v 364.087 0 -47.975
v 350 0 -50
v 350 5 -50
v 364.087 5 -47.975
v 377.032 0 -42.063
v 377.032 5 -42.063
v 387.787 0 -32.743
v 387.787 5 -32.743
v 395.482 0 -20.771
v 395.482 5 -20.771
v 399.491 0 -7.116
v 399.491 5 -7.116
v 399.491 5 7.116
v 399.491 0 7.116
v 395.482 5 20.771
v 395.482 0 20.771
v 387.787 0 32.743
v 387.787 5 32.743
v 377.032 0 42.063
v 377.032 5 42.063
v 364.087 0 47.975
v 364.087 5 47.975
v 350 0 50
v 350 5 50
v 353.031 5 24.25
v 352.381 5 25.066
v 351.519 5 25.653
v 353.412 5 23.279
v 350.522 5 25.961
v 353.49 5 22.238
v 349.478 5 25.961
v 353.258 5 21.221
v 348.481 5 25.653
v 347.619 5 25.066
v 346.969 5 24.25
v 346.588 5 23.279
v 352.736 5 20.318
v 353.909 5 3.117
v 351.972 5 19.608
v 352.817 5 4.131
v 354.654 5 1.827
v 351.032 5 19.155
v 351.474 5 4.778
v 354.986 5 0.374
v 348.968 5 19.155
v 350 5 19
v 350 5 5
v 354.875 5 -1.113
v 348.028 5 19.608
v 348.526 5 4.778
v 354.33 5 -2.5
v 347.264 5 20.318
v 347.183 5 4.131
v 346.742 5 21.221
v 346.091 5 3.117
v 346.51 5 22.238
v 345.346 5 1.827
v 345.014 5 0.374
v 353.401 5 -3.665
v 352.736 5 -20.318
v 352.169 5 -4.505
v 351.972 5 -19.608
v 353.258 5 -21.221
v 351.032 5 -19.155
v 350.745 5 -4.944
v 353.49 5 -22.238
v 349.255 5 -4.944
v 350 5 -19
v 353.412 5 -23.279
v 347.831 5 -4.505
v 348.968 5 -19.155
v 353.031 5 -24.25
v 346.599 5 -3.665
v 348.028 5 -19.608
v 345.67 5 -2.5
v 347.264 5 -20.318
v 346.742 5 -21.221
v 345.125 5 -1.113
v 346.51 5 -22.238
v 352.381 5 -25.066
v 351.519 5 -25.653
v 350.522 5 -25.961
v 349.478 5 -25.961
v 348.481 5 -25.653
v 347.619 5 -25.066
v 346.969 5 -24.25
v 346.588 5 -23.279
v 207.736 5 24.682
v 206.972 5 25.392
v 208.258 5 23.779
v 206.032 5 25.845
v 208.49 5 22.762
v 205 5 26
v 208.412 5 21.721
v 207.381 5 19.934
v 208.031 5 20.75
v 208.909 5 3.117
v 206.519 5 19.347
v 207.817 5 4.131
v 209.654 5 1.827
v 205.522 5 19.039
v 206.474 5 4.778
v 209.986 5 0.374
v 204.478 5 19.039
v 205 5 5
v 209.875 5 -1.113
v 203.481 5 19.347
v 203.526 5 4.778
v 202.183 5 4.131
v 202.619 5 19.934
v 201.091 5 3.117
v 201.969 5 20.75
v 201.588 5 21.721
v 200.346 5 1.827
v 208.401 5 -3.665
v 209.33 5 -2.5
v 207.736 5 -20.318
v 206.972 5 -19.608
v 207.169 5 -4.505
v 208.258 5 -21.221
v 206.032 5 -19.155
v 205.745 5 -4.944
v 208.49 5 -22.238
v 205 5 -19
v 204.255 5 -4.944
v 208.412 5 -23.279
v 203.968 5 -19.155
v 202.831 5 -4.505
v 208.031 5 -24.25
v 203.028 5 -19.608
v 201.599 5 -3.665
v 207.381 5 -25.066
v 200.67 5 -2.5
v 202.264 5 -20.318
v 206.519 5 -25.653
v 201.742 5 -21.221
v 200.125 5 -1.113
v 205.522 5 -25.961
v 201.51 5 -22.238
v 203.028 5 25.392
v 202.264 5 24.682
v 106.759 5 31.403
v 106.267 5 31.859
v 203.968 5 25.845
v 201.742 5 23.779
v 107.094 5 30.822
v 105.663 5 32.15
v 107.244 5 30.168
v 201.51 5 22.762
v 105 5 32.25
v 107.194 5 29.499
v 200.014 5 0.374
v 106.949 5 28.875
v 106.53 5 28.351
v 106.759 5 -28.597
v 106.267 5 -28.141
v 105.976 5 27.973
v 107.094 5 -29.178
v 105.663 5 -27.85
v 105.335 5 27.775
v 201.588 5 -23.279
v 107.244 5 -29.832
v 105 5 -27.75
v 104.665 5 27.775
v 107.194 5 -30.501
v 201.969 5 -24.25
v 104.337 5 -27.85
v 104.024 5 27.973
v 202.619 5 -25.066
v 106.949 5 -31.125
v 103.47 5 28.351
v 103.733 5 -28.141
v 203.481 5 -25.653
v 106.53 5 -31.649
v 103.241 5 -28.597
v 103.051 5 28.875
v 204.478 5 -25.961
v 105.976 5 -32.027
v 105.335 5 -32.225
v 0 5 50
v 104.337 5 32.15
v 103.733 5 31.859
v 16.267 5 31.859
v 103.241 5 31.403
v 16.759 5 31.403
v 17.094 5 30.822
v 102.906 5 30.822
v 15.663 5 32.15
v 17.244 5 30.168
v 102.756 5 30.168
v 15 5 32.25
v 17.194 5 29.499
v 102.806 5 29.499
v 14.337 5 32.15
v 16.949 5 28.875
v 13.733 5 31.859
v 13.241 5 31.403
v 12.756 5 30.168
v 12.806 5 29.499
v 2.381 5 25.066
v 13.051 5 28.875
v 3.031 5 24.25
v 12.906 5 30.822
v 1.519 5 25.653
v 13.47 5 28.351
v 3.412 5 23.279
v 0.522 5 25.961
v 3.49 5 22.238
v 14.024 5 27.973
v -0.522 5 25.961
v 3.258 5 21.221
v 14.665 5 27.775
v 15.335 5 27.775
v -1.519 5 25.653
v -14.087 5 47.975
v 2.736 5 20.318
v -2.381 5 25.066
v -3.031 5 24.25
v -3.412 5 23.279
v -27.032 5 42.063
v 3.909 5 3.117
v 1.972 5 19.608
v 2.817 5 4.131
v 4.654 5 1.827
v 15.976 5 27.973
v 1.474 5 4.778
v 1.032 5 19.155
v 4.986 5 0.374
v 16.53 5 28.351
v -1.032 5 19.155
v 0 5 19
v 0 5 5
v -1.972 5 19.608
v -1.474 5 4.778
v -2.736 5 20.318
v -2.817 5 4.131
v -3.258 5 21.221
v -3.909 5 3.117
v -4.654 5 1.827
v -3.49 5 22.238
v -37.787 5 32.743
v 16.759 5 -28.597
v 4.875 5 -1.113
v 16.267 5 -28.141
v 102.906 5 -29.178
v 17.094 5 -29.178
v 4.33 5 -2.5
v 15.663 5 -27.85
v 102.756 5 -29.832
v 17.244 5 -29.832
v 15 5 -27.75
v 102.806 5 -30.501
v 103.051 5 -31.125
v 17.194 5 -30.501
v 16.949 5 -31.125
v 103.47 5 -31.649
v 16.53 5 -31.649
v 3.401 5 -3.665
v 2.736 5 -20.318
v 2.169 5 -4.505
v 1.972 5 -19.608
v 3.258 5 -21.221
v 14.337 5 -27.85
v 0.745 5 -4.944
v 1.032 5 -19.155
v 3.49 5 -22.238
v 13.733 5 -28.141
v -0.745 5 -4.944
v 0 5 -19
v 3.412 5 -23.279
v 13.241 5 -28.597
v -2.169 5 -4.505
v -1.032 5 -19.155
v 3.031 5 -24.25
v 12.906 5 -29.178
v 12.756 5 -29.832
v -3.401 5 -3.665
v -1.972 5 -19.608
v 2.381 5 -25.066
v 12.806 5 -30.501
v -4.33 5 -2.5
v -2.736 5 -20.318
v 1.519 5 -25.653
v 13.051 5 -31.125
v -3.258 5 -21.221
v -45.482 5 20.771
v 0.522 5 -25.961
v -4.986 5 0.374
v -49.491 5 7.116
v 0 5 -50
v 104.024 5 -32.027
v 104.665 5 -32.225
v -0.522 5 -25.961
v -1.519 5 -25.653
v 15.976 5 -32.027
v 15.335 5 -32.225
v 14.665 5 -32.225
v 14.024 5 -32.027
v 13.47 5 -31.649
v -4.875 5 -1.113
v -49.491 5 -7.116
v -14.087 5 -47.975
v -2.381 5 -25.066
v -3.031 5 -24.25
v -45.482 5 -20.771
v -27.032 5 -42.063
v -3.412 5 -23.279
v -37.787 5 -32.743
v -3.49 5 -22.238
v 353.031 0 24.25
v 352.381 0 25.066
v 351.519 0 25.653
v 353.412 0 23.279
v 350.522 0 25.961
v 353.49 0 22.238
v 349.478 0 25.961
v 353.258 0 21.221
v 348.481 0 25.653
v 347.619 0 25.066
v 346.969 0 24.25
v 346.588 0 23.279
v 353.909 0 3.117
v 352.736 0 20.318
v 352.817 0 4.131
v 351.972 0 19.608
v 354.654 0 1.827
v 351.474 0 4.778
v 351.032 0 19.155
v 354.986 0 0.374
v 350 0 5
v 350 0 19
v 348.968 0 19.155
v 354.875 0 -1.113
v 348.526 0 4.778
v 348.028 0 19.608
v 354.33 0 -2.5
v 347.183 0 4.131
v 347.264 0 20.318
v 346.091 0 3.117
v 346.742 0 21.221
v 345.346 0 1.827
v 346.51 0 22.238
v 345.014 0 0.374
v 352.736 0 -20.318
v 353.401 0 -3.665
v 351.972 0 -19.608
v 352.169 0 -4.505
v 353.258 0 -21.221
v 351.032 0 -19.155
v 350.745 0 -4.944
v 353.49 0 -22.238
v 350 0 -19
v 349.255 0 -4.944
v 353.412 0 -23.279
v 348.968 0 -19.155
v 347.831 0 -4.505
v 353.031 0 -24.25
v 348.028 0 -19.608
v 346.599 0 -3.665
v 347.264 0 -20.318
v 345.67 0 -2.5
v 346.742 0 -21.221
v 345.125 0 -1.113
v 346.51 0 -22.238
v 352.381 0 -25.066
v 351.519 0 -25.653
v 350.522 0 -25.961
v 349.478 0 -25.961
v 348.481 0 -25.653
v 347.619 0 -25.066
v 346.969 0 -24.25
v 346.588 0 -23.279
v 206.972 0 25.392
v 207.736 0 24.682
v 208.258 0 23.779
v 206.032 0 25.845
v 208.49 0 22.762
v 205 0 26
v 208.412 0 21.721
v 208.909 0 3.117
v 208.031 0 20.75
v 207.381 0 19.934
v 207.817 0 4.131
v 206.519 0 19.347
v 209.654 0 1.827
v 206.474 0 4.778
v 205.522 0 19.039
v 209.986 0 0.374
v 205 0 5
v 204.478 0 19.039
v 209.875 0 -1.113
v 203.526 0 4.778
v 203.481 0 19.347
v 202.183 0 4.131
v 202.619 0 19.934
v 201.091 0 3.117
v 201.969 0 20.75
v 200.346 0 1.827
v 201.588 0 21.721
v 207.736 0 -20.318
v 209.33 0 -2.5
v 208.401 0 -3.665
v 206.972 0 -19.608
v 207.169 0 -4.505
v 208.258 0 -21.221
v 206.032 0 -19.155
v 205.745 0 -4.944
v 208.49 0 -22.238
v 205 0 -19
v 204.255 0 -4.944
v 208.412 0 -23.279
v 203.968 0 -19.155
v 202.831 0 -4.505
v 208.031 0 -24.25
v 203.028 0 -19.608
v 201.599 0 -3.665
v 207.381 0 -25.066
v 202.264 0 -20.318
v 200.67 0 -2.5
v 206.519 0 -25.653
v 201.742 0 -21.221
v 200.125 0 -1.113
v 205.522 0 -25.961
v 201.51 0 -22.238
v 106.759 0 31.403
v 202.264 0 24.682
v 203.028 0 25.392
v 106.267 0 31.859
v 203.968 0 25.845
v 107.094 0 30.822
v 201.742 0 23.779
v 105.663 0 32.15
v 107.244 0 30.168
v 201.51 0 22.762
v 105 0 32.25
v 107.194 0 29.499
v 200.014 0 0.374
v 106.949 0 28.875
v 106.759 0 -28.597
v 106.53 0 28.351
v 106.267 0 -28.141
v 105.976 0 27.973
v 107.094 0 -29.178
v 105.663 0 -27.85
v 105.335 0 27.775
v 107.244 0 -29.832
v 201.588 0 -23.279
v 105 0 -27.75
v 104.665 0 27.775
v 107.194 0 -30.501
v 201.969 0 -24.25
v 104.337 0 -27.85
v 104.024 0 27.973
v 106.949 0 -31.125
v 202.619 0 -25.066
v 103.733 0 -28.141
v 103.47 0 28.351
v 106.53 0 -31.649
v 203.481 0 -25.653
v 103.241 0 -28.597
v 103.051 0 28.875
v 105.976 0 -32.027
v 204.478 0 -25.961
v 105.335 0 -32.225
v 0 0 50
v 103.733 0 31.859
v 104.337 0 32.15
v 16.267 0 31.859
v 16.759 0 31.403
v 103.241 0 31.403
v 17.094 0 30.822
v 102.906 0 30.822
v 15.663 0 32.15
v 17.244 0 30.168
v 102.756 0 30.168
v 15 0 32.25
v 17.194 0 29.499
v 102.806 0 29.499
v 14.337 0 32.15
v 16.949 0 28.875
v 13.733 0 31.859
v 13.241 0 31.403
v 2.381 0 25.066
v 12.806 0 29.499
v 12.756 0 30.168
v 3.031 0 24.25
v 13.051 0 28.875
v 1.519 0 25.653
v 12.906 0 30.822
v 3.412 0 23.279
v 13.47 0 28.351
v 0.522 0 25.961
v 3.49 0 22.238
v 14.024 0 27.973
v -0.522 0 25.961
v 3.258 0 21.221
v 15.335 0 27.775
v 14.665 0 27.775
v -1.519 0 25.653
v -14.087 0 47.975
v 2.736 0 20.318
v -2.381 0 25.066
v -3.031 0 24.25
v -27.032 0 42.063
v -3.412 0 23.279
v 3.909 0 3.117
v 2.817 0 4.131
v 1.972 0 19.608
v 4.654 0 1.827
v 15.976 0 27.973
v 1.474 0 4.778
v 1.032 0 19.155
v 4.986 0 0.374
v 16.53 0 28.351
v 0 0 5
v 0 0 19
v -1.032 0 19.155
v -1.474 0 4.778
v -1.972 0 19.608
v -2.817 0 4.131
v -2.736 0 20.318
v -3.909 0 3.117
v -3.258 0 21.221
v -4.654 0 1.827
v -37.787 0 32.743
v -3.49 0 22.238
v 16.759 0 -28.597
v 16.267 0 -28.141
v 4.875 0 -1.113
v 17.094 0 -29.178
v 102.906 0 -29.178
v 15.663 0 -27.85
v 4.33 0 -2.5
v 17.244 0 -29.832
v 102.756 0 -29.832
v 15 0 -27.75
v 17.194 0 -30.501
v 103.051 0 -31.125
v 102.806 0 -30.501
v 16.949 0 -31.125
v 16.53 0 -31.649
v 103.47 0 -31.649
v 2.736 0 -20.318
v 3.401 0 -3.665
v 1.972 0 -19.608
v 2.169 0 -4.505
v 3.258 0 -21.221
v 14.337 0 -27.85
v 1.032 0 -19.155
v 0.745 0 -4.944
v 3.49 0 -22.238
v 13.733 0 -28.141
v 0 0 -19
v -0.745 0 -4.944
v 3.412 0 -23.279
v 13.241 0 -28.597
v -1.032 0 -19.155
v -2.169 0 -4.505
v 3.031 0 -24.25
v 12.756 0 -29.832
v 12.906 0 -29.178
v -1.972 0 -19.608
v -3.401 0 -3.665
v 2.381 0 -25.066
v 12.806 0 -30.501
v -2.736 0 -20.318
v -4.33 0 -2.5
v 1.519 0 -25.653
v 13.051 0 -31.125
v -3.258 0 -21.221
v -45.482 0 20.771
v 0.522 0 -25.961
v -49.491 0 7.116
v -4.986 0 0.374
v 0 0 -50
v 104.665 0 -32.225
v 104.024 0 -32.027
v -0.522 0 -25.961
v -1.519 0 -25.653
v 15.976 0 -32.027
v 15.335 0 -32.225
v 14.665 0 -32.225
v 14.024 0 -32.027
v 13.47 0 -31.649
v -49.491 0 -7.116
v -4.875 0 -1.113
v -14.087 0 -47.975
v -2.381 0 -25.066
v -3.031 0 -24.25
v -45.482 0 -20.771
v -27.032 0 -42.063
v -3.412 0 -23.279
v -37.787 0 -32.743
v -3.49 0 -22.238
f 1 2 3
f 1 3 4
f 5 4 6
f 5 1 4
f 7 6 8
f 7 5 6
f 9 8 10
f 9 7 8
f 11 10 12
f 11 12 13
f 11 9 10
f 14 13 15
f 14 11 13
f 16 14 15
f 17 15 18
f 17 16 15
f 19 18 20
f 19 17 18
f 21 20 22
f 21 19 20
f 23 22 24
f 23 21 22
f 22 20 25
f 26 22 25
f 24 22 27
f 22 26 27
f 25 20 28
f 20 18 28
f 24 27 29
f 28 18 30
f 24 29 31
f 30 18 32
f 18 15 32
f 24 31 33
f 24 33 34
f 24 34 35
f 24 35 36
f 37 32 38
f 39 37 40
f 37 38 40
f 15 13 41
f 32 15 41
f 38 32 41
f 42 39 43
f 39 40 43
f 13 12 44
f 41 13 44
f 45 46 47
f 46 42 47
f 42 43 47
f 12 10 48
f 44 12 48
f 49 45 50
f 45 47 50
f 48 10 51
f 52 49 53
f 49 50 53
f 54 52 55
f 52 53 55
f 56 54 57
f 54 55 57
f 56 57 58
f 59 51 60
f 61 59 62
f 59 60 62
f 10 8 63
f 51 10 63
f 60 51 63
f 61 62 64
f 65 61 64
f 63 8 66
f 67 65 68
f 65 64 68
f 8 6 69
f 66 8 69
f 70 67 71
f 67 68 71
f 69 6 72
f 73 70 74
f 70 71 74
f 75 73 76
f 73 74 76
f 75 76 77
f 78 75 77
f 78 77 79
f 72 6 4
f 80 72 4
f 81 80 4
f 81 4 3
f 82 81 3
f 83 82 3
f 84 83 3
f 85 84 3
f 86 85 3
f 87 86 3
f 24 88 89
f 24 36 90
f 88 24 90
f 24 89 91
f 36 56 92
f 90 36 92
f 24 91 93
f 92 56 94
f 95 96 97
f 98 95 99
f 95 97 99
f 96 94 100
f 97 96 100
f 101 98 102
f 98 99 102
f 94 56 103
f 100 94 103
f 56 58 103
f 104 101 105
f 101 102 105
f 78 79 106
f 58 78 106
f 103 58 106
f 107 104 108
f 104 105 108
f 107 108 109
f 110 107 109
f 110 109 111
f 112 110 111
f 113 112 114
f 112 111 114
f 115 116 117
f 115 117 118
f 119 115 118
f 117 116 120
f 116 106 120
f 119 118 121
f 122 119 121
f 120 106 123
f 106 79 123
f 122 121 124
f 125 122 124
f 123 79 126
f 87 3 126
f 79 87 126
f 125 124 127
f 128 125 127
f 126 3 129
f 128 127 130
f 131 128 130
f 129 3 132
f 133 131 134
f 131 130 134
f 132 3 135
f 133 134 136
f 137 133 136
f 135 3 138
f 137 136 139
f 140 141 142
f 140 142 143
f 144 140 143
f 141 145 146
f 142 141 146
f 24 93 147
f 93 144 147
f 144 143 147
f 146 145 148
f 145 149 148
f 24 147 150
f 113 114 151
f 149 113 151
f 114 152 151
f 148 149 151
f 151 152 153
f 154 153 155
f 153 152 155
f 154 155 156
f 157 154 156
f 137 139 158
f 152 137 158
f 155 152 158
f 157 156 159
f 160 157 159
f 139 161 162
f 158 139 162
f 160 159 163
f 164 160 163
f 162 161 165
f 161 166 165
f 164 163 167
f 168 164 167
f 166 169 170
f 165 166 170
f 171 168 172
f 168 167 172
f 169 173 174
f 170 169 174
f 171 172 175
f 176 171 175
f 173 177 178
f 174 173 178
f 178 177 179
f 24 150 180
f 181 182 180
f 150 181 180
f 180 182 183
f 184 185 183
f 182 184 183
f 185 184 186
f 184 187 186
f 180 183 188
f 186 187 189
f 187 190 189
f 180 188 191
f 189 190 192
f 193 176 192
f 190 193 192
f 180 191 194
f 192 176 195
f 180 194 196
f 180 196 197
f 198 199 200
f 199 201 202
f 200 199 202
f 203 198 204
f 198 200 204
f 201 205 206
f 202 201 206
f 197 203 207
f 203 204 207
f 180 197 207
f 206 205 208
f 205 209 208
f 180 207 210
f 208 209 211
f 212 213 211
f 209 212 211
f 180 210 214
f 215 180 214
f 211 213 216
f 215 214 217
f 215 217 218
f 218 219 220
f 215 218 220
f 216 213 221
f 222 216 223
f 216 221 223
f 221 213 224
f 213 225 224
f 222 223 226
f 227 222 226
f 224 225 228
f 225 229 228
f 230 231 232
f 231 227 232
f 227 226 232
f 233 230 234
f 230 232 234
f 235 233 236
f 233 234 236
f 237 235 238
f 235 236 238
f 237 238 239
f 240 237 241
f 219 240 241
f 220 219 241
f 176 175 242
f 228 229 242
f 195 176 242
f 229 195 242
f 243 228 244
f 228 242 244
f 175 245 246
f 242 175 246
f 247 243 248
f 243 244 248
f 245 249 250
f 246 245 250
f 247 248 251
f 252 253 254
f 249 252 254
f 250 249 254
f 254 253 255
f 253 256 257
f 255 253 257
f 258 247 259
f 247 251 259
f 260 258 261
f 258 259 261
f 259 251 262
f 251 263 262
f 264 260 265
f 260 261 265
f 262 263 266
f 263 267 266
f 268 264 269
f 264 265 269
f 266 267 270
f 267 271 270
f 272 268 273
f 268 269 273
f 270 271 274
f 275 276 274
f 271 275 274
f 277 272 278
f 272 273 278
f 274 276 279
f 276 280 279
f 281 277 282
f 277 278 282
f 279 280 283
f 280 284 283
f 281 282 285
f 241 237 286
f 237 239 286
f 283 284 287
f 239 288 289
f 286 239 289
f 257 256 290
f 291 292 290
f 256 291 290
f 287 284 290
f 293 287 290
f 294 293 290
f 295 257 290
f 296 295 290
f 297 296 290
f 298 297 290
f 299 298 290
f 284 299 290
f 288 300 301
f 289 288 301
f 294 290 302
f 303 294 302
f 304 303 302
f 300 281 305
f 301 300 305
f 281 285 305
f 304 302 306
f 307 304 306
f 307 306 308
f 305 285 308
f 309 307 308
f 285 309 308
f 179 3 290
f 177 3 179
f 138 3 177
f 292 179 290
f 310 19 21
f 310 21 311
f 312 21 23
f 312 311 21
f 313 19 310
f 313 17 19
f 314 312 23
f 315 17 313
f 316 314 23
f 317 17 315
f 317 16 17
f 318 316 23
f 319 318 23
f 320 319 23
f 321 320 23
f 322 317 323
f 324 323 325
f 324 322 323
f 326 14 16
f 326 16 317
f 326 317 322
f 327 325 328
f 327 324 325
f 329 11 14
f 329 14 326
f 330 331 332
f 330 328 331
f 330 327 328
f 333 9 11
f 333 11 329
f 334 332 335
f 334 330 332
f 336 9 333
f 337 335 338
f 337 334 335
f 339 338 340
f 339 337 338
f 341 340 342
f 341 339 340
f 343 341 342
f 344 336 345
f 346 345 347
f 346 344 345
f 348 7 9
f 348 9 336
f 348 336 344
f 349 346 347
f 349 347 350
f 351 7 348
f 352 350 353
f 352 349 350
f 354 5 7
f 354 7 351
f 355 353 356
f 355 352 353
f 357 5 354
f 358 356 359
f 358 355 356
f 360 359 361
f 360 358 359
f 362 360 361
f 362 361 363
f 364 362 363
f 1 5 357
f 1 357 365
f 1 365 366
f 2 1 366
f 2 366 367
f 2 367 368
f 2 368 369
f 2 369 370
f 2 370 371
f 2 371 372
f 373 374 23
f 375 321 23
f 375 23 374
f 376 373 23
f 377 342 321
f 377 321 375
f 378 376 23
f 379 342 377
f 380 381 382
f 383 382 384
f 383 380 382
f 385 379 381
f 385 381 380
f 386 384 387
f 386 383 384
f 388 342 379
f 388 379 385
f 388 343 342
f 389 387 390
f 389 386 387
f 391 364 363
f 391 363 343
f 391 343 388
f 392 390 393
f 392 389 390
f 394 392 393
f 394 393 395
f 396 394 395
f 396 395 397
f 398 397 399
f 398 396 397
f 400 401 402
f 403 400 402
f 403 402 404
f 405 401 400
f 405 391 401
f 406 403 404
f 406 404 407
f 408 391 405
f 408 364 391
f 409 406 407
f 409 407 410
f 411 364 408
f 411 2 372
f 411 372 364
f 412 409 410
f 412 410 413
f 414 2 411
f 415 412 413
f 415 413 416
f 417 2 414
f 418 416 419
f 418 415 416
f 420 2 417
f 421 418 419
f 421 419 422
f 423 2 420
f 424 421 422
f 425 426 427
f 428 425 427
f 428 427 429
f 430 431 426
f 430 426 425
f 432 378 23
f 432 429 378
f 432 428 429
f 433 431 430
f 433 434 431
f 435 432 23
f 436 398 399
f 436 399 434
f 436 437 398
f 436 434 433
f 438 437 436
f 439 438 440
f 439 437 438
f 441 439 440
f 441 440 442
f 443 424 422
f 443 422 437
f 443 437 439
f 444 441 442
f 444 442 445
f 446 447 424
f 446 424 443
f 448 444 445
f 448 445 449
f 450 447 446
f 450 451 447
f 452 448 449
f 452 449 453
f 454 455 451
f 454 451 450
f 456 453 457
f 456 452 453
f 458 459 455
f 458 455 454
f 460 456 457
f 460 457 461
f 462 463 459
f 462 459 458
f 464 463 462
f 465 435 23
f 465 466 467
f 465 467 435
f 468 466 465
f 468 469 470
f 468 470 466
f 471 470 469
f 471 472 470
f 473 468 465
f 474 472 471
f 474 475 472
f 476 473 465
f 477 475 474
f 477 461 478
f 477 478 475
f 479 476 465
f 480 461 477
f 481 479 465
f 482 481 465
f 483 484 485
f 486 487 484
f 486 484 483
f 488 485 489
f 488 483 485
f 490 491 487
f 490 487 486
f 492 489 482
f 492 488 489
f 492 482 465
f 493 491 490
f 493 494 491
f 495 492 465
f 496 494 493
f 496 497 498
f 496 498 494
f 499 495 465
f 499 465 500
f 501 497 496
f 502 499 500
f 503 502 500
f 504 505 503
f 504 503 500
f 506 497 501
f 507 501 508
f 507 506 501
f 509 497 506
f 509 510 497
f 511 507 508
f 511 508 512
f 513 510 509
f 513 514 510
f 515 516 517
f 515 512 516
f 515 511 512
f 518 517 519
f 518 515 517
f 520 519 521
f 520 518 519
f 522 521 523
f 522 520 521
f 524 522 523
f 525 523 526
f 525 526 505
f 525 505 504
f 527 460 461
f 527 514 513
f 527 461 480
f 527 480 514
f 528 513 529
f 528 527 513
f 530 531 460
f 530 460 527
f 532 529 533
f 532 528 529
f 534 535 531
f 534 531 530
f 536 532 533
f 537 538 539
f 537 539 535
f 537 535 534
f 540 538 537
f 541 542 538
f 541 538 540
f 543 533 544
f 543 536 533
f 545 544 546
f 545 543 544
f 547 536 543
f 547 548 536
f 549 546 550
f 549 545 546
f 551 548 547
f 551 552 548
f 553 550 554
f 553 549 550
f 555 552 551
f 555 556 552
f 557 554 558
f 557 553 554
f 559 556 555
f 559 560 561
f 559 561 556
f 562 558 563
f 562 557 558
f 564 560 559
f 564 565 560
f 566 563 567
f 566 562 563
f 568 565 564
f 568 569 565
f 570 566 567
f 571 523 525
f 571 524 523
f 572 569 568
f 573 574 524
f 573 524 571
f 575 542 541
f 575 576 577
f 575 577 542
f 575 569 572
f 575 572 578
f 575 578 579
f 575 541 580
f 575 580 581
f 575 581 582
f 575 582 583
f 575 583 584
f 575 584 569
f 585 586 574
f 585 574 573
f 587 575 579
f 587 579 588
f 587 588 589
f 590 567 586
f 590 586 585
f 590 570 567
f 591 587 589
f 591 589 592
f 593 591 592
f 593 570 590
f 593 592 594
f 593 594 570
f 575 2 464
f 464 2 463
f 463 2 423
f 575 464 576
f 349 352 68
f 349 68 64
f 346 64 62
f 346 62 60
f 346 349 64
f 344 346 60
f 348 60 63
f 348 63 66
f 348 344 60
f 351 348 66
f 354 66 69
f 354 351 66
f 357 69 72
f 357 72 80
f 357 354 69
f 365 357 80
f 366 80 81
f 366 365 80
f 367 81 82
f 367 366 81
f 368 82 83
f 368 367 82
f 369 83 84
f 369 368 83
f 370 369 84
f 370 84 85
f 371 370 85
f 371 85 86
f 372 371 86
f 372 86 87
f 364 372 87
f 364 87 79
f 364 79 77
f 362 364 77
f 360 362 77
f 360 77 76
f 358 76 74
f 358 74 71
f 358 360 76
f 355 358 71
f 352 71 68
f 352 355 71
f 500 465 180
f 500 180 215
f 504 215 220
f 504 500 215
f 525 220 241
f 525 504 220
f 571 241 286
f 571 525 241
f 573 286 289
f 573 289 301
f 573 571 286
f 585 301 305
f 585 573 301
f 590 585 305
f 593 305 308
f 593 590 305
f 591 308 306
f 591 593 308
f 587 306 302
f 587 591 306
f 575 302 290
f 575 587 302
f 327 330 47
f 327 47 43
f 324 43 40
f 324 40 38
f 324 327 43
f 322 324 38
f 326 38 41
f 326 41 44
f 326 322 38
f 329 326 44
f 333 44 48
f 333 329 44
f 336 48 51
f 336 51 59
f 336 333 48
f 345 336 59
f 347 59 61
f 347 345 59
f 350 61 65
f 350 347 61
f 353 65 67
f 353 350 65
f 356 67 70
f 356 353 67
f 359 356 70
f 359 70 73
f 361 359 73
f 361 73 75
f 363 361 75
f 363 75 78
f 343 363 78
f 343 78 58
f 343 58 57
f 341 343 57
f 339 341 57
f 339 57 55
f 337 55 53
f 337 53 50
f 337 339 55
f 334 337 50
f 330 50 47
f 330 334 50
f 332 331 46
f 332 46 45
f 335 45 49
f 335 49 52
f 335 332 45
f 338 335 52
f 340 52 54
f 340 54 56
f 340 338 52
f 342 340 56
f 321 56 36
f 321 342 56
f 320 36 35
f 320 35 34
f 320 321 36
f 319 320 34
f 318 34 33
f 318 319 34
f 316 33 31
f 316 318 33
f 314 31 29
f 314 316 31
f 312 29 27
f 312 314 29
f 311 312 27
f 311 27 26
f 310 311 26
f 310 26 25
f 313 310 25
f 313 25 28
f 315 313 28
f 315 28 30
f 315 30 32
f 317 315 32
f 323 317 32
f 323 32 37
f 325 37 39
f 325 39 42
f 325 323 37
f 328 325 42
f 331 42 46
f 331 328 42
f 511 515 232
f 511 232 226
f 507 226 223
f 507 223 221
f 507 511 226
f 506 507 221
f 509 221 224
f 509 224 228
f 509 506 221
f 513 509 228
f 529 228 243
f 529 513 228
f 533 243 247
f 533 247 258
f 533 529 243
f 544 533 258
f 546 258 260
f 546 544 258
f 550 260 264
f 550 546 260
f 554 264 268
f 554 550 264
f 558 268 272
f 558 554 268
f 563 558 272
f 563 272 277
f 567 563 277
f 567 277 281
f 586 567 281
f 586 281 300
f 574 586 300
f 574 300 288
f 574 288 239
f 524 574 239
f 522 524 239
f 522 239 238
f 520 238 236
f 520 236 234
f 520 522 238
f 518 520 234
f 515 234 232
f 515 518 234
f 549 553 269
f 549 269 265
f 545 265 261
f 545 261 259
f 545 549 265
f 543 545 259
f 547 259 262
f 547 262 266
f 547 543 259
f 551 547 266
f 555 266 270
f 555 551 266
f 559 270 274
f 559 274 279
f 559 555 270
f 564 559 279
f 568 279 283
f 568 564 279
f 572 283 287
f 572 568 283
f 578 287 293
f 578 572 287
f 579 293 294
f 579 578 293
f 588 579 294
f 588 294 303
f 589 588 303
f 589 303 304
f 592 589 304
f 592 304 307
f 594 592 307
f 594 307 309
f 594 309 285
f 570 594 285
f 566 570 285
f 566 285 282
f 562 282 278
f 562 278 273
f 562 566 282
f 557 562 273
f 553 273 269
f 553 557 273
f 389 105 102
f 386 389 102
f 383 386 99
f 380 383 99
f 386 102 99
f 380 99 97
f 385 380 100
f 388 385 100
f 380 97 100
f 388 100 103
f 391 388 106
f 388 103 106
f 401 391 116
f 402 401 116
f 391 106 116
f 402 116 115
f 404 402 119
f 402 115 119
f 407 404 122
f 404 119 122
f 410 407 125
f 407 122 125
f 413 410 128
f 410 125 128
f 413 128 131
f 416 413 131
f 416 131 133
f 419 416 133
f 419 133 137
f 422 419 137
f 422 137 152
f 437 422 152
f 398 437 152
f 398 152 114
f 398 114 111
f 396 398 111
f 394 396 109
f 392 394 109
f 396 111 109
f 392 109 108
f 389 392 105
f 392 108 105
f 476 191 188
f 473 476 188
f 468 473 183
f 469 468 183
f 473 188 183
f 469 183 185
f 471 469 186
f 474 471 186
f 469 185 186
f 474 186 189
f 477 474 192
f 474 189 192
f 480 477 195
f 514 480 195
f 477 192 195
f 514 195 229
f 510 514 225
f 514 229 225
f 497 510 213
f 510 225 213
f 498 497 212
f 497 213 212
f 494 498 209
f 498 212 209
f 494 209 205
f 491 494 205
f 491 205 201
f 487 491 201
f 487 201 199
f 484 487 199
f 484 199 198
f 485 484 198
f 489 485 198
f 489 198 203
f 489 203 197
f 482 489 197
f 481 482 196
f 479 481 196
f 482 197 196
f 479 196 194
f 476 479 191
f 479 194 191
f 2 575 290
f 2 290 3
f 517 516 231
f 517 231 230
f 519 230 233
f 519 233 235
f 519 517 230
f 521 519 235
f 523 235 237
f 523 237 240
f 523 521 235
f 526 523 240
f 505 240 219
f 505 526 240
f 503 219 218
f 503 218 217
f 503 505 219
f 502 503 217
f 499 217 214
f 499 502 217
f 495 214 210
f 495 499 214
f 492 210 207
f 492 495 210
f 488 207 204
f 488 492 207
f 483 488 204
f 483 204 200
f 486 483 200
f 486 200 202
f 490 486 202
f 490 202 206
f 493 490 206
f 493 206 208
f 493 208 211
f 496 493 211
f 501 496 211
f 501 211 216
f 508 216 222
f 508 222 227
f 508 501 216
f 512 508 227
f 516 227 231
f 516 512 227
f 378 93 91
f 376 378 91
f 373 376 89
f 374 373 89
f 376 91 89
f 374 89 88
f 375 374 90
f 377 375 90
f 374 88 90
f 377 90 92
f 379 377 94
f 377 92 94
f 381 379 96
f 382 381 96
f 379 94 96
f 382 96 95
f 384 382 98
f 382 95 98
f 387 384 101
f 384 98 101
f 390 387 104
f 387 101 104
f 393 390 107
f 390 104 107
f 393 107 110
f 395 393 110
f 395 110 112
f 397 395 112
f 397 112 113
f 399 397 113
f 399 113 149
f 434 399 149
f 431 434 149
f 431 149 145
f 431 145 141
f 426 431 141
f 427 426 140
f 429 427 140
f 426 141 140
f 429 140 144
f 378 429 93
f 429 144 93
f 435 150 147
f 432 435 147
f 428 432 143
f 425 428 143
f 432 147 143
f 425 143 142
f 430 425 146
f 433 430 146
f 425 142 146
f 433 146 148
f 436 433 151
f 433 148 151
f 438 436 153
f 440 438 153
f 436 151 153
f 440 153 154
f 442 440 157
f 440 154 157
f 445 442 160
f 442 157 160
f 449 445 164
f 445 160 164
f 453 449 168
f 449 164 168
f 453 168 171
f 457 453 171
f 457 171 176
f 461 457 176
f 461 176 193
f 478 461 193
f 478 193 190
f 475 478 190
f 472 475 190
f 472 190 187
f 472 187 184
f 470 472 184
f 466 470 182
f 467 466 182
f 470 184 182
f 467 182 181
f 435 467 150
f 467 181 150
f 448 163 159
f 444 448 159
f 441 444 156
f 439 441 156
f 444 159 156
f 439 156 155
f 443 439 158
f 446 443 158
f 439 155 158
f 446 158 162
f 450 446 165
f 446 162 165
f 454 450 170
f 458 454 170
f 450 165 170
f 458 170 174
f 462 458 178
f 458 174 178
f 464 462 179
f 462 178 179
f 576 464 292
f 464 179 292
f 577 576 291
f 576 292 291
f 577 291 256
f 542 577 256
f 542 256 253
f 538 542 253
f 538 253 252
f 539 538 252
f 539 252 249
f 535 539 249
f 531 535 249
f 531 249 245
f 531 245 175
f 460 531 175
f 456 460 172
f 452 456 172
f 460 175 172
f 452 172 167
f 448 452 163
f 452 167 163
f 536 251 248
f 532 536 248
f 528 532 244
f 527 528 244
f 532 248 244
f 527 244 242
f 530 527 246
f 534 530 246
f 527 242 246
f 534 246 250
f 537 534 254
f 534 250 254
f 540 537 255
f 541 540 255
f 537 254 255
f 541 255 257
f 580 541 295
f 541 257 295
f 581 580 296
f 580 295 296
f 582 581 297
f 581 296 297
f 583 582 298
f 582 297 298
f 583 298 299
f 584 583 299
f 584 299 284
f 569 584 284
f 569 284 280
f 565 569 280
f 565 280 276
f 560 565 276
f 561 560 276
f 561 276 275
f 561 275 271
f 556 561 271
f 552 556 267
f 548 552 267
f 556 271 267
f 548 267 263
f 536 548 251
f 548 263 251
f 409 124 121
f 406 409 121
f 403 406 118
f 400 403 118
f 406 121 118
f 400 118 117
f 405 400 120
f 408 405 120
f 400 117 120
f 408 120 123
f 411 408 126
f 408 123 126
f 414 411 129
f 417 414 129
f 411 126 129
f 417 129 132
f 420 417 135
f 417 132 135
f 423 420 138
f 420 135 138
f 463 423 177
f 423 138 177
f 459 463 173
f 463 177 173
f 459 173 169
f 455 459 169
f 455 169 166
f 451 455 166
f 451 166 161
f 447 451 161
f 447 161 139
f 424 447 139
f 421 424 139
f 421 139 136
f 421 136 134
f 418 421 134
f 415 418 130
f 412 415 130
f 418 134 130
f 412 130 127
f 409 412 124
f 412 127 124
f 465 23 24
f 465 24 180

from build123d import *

# Parameters (mm, degrees)
SKETCH1_R           = 5
SKETCH1_R_2         = 3.5
BOSS_EXTRUDE1_DEPTH = 5
SKETCH2_R           = 3.5
SKETCH2_R_2         = 2.25
SKETCH2_R_3         = 5
CUT_EXTRUDE1_DEPTH  = 5


with BuildPart() as part:
    # Sketch1 → Boss-Extrude1 (new body)
    with BuildSketch(Plane(origin=(0, 0, 0), x_dir=(1, 0, 0), z_dir=(0, 1, 0))):
        with BuildLine():
            Line((0, 50), (350, 50))
            ThreePointArc((350, 50), (400, 0), (350, -50))
            Line((350, -50), (0, -50))
            ThreePointArc((0, -50), (-50, 0), (0, 50))
        make_face()
        with Locations(Location((0, 0, 0), (0, 0, 270))):
            Circle(SKETCH1_R, mode=Mode.SUBTRACT)
        with Locations(Location((350, 0, 0), (0, 0, 270))):
            Circle(SKETCH1_R, mode=Mode.SUBTRACT)
        with Locations(Location((0, 22.5, 0), (0, 0, 270))):
            Circle(SKETCH1_R_2, mode=Mode.SUBTRACT)
        with Locations(Location((350, 22.5, 0), (0, 0, 270))):
            Circle(SKETCH1_R_2, mode=Mode.SUBTRACT)
        with Locations(Location((350, -22.5, 0), (0, 0, 90))):
            Circle(SKETCH1_R_2, mode=Mode.SUBTRACT)
        with Locations(Location((0, -22.5, 0), (0, 0, 90))):
            Circle(SKETCH1_R_2, mode=Mode.SUBTRACT)
    extrude(amount=BOSS_EXTRUDE1_DEPTH)

    # Sketch2 → Cut-Extrude1 (cut)
    with BuildSketch(Plane(origin=(0, 5, 0), x_dir=(1, 0, 0), z_dir=(0, 1, 0))):
        with Locations(Location((205, 22.5, 0), (0, 0, 270))):
            Circle(SKETCH2_R)
        with Locations(Location((15, -30, 0), (0, 0, 270))):
            Circle(SKETCH2_R_2)
        with Locations(Location((105, -30, 0), (0, 0, 270))):
            Circle(SKETCH2_R_2)
        with Locations(Location((105, 30, 0), (0, 0, 270))):
            Circle(SKETCH2_R_2)
        with Locations(Location((15, 30, 0), (0, 0, 270))):
            Circle(SKETCH2_R_2)
        with Locations(Location((205, 0, 0), (0, 0, 270))):
            Circle(SKETCH2_R_3)
        with Locations(Location((205, -22.5, 0), (0, 0, 270))):
            Circle(SKETCH2_R)
    extrude(amount=-CUT_EXTRUDE1_DEPTH, mode=Mode.SUBTRACT)


solid = part.part
